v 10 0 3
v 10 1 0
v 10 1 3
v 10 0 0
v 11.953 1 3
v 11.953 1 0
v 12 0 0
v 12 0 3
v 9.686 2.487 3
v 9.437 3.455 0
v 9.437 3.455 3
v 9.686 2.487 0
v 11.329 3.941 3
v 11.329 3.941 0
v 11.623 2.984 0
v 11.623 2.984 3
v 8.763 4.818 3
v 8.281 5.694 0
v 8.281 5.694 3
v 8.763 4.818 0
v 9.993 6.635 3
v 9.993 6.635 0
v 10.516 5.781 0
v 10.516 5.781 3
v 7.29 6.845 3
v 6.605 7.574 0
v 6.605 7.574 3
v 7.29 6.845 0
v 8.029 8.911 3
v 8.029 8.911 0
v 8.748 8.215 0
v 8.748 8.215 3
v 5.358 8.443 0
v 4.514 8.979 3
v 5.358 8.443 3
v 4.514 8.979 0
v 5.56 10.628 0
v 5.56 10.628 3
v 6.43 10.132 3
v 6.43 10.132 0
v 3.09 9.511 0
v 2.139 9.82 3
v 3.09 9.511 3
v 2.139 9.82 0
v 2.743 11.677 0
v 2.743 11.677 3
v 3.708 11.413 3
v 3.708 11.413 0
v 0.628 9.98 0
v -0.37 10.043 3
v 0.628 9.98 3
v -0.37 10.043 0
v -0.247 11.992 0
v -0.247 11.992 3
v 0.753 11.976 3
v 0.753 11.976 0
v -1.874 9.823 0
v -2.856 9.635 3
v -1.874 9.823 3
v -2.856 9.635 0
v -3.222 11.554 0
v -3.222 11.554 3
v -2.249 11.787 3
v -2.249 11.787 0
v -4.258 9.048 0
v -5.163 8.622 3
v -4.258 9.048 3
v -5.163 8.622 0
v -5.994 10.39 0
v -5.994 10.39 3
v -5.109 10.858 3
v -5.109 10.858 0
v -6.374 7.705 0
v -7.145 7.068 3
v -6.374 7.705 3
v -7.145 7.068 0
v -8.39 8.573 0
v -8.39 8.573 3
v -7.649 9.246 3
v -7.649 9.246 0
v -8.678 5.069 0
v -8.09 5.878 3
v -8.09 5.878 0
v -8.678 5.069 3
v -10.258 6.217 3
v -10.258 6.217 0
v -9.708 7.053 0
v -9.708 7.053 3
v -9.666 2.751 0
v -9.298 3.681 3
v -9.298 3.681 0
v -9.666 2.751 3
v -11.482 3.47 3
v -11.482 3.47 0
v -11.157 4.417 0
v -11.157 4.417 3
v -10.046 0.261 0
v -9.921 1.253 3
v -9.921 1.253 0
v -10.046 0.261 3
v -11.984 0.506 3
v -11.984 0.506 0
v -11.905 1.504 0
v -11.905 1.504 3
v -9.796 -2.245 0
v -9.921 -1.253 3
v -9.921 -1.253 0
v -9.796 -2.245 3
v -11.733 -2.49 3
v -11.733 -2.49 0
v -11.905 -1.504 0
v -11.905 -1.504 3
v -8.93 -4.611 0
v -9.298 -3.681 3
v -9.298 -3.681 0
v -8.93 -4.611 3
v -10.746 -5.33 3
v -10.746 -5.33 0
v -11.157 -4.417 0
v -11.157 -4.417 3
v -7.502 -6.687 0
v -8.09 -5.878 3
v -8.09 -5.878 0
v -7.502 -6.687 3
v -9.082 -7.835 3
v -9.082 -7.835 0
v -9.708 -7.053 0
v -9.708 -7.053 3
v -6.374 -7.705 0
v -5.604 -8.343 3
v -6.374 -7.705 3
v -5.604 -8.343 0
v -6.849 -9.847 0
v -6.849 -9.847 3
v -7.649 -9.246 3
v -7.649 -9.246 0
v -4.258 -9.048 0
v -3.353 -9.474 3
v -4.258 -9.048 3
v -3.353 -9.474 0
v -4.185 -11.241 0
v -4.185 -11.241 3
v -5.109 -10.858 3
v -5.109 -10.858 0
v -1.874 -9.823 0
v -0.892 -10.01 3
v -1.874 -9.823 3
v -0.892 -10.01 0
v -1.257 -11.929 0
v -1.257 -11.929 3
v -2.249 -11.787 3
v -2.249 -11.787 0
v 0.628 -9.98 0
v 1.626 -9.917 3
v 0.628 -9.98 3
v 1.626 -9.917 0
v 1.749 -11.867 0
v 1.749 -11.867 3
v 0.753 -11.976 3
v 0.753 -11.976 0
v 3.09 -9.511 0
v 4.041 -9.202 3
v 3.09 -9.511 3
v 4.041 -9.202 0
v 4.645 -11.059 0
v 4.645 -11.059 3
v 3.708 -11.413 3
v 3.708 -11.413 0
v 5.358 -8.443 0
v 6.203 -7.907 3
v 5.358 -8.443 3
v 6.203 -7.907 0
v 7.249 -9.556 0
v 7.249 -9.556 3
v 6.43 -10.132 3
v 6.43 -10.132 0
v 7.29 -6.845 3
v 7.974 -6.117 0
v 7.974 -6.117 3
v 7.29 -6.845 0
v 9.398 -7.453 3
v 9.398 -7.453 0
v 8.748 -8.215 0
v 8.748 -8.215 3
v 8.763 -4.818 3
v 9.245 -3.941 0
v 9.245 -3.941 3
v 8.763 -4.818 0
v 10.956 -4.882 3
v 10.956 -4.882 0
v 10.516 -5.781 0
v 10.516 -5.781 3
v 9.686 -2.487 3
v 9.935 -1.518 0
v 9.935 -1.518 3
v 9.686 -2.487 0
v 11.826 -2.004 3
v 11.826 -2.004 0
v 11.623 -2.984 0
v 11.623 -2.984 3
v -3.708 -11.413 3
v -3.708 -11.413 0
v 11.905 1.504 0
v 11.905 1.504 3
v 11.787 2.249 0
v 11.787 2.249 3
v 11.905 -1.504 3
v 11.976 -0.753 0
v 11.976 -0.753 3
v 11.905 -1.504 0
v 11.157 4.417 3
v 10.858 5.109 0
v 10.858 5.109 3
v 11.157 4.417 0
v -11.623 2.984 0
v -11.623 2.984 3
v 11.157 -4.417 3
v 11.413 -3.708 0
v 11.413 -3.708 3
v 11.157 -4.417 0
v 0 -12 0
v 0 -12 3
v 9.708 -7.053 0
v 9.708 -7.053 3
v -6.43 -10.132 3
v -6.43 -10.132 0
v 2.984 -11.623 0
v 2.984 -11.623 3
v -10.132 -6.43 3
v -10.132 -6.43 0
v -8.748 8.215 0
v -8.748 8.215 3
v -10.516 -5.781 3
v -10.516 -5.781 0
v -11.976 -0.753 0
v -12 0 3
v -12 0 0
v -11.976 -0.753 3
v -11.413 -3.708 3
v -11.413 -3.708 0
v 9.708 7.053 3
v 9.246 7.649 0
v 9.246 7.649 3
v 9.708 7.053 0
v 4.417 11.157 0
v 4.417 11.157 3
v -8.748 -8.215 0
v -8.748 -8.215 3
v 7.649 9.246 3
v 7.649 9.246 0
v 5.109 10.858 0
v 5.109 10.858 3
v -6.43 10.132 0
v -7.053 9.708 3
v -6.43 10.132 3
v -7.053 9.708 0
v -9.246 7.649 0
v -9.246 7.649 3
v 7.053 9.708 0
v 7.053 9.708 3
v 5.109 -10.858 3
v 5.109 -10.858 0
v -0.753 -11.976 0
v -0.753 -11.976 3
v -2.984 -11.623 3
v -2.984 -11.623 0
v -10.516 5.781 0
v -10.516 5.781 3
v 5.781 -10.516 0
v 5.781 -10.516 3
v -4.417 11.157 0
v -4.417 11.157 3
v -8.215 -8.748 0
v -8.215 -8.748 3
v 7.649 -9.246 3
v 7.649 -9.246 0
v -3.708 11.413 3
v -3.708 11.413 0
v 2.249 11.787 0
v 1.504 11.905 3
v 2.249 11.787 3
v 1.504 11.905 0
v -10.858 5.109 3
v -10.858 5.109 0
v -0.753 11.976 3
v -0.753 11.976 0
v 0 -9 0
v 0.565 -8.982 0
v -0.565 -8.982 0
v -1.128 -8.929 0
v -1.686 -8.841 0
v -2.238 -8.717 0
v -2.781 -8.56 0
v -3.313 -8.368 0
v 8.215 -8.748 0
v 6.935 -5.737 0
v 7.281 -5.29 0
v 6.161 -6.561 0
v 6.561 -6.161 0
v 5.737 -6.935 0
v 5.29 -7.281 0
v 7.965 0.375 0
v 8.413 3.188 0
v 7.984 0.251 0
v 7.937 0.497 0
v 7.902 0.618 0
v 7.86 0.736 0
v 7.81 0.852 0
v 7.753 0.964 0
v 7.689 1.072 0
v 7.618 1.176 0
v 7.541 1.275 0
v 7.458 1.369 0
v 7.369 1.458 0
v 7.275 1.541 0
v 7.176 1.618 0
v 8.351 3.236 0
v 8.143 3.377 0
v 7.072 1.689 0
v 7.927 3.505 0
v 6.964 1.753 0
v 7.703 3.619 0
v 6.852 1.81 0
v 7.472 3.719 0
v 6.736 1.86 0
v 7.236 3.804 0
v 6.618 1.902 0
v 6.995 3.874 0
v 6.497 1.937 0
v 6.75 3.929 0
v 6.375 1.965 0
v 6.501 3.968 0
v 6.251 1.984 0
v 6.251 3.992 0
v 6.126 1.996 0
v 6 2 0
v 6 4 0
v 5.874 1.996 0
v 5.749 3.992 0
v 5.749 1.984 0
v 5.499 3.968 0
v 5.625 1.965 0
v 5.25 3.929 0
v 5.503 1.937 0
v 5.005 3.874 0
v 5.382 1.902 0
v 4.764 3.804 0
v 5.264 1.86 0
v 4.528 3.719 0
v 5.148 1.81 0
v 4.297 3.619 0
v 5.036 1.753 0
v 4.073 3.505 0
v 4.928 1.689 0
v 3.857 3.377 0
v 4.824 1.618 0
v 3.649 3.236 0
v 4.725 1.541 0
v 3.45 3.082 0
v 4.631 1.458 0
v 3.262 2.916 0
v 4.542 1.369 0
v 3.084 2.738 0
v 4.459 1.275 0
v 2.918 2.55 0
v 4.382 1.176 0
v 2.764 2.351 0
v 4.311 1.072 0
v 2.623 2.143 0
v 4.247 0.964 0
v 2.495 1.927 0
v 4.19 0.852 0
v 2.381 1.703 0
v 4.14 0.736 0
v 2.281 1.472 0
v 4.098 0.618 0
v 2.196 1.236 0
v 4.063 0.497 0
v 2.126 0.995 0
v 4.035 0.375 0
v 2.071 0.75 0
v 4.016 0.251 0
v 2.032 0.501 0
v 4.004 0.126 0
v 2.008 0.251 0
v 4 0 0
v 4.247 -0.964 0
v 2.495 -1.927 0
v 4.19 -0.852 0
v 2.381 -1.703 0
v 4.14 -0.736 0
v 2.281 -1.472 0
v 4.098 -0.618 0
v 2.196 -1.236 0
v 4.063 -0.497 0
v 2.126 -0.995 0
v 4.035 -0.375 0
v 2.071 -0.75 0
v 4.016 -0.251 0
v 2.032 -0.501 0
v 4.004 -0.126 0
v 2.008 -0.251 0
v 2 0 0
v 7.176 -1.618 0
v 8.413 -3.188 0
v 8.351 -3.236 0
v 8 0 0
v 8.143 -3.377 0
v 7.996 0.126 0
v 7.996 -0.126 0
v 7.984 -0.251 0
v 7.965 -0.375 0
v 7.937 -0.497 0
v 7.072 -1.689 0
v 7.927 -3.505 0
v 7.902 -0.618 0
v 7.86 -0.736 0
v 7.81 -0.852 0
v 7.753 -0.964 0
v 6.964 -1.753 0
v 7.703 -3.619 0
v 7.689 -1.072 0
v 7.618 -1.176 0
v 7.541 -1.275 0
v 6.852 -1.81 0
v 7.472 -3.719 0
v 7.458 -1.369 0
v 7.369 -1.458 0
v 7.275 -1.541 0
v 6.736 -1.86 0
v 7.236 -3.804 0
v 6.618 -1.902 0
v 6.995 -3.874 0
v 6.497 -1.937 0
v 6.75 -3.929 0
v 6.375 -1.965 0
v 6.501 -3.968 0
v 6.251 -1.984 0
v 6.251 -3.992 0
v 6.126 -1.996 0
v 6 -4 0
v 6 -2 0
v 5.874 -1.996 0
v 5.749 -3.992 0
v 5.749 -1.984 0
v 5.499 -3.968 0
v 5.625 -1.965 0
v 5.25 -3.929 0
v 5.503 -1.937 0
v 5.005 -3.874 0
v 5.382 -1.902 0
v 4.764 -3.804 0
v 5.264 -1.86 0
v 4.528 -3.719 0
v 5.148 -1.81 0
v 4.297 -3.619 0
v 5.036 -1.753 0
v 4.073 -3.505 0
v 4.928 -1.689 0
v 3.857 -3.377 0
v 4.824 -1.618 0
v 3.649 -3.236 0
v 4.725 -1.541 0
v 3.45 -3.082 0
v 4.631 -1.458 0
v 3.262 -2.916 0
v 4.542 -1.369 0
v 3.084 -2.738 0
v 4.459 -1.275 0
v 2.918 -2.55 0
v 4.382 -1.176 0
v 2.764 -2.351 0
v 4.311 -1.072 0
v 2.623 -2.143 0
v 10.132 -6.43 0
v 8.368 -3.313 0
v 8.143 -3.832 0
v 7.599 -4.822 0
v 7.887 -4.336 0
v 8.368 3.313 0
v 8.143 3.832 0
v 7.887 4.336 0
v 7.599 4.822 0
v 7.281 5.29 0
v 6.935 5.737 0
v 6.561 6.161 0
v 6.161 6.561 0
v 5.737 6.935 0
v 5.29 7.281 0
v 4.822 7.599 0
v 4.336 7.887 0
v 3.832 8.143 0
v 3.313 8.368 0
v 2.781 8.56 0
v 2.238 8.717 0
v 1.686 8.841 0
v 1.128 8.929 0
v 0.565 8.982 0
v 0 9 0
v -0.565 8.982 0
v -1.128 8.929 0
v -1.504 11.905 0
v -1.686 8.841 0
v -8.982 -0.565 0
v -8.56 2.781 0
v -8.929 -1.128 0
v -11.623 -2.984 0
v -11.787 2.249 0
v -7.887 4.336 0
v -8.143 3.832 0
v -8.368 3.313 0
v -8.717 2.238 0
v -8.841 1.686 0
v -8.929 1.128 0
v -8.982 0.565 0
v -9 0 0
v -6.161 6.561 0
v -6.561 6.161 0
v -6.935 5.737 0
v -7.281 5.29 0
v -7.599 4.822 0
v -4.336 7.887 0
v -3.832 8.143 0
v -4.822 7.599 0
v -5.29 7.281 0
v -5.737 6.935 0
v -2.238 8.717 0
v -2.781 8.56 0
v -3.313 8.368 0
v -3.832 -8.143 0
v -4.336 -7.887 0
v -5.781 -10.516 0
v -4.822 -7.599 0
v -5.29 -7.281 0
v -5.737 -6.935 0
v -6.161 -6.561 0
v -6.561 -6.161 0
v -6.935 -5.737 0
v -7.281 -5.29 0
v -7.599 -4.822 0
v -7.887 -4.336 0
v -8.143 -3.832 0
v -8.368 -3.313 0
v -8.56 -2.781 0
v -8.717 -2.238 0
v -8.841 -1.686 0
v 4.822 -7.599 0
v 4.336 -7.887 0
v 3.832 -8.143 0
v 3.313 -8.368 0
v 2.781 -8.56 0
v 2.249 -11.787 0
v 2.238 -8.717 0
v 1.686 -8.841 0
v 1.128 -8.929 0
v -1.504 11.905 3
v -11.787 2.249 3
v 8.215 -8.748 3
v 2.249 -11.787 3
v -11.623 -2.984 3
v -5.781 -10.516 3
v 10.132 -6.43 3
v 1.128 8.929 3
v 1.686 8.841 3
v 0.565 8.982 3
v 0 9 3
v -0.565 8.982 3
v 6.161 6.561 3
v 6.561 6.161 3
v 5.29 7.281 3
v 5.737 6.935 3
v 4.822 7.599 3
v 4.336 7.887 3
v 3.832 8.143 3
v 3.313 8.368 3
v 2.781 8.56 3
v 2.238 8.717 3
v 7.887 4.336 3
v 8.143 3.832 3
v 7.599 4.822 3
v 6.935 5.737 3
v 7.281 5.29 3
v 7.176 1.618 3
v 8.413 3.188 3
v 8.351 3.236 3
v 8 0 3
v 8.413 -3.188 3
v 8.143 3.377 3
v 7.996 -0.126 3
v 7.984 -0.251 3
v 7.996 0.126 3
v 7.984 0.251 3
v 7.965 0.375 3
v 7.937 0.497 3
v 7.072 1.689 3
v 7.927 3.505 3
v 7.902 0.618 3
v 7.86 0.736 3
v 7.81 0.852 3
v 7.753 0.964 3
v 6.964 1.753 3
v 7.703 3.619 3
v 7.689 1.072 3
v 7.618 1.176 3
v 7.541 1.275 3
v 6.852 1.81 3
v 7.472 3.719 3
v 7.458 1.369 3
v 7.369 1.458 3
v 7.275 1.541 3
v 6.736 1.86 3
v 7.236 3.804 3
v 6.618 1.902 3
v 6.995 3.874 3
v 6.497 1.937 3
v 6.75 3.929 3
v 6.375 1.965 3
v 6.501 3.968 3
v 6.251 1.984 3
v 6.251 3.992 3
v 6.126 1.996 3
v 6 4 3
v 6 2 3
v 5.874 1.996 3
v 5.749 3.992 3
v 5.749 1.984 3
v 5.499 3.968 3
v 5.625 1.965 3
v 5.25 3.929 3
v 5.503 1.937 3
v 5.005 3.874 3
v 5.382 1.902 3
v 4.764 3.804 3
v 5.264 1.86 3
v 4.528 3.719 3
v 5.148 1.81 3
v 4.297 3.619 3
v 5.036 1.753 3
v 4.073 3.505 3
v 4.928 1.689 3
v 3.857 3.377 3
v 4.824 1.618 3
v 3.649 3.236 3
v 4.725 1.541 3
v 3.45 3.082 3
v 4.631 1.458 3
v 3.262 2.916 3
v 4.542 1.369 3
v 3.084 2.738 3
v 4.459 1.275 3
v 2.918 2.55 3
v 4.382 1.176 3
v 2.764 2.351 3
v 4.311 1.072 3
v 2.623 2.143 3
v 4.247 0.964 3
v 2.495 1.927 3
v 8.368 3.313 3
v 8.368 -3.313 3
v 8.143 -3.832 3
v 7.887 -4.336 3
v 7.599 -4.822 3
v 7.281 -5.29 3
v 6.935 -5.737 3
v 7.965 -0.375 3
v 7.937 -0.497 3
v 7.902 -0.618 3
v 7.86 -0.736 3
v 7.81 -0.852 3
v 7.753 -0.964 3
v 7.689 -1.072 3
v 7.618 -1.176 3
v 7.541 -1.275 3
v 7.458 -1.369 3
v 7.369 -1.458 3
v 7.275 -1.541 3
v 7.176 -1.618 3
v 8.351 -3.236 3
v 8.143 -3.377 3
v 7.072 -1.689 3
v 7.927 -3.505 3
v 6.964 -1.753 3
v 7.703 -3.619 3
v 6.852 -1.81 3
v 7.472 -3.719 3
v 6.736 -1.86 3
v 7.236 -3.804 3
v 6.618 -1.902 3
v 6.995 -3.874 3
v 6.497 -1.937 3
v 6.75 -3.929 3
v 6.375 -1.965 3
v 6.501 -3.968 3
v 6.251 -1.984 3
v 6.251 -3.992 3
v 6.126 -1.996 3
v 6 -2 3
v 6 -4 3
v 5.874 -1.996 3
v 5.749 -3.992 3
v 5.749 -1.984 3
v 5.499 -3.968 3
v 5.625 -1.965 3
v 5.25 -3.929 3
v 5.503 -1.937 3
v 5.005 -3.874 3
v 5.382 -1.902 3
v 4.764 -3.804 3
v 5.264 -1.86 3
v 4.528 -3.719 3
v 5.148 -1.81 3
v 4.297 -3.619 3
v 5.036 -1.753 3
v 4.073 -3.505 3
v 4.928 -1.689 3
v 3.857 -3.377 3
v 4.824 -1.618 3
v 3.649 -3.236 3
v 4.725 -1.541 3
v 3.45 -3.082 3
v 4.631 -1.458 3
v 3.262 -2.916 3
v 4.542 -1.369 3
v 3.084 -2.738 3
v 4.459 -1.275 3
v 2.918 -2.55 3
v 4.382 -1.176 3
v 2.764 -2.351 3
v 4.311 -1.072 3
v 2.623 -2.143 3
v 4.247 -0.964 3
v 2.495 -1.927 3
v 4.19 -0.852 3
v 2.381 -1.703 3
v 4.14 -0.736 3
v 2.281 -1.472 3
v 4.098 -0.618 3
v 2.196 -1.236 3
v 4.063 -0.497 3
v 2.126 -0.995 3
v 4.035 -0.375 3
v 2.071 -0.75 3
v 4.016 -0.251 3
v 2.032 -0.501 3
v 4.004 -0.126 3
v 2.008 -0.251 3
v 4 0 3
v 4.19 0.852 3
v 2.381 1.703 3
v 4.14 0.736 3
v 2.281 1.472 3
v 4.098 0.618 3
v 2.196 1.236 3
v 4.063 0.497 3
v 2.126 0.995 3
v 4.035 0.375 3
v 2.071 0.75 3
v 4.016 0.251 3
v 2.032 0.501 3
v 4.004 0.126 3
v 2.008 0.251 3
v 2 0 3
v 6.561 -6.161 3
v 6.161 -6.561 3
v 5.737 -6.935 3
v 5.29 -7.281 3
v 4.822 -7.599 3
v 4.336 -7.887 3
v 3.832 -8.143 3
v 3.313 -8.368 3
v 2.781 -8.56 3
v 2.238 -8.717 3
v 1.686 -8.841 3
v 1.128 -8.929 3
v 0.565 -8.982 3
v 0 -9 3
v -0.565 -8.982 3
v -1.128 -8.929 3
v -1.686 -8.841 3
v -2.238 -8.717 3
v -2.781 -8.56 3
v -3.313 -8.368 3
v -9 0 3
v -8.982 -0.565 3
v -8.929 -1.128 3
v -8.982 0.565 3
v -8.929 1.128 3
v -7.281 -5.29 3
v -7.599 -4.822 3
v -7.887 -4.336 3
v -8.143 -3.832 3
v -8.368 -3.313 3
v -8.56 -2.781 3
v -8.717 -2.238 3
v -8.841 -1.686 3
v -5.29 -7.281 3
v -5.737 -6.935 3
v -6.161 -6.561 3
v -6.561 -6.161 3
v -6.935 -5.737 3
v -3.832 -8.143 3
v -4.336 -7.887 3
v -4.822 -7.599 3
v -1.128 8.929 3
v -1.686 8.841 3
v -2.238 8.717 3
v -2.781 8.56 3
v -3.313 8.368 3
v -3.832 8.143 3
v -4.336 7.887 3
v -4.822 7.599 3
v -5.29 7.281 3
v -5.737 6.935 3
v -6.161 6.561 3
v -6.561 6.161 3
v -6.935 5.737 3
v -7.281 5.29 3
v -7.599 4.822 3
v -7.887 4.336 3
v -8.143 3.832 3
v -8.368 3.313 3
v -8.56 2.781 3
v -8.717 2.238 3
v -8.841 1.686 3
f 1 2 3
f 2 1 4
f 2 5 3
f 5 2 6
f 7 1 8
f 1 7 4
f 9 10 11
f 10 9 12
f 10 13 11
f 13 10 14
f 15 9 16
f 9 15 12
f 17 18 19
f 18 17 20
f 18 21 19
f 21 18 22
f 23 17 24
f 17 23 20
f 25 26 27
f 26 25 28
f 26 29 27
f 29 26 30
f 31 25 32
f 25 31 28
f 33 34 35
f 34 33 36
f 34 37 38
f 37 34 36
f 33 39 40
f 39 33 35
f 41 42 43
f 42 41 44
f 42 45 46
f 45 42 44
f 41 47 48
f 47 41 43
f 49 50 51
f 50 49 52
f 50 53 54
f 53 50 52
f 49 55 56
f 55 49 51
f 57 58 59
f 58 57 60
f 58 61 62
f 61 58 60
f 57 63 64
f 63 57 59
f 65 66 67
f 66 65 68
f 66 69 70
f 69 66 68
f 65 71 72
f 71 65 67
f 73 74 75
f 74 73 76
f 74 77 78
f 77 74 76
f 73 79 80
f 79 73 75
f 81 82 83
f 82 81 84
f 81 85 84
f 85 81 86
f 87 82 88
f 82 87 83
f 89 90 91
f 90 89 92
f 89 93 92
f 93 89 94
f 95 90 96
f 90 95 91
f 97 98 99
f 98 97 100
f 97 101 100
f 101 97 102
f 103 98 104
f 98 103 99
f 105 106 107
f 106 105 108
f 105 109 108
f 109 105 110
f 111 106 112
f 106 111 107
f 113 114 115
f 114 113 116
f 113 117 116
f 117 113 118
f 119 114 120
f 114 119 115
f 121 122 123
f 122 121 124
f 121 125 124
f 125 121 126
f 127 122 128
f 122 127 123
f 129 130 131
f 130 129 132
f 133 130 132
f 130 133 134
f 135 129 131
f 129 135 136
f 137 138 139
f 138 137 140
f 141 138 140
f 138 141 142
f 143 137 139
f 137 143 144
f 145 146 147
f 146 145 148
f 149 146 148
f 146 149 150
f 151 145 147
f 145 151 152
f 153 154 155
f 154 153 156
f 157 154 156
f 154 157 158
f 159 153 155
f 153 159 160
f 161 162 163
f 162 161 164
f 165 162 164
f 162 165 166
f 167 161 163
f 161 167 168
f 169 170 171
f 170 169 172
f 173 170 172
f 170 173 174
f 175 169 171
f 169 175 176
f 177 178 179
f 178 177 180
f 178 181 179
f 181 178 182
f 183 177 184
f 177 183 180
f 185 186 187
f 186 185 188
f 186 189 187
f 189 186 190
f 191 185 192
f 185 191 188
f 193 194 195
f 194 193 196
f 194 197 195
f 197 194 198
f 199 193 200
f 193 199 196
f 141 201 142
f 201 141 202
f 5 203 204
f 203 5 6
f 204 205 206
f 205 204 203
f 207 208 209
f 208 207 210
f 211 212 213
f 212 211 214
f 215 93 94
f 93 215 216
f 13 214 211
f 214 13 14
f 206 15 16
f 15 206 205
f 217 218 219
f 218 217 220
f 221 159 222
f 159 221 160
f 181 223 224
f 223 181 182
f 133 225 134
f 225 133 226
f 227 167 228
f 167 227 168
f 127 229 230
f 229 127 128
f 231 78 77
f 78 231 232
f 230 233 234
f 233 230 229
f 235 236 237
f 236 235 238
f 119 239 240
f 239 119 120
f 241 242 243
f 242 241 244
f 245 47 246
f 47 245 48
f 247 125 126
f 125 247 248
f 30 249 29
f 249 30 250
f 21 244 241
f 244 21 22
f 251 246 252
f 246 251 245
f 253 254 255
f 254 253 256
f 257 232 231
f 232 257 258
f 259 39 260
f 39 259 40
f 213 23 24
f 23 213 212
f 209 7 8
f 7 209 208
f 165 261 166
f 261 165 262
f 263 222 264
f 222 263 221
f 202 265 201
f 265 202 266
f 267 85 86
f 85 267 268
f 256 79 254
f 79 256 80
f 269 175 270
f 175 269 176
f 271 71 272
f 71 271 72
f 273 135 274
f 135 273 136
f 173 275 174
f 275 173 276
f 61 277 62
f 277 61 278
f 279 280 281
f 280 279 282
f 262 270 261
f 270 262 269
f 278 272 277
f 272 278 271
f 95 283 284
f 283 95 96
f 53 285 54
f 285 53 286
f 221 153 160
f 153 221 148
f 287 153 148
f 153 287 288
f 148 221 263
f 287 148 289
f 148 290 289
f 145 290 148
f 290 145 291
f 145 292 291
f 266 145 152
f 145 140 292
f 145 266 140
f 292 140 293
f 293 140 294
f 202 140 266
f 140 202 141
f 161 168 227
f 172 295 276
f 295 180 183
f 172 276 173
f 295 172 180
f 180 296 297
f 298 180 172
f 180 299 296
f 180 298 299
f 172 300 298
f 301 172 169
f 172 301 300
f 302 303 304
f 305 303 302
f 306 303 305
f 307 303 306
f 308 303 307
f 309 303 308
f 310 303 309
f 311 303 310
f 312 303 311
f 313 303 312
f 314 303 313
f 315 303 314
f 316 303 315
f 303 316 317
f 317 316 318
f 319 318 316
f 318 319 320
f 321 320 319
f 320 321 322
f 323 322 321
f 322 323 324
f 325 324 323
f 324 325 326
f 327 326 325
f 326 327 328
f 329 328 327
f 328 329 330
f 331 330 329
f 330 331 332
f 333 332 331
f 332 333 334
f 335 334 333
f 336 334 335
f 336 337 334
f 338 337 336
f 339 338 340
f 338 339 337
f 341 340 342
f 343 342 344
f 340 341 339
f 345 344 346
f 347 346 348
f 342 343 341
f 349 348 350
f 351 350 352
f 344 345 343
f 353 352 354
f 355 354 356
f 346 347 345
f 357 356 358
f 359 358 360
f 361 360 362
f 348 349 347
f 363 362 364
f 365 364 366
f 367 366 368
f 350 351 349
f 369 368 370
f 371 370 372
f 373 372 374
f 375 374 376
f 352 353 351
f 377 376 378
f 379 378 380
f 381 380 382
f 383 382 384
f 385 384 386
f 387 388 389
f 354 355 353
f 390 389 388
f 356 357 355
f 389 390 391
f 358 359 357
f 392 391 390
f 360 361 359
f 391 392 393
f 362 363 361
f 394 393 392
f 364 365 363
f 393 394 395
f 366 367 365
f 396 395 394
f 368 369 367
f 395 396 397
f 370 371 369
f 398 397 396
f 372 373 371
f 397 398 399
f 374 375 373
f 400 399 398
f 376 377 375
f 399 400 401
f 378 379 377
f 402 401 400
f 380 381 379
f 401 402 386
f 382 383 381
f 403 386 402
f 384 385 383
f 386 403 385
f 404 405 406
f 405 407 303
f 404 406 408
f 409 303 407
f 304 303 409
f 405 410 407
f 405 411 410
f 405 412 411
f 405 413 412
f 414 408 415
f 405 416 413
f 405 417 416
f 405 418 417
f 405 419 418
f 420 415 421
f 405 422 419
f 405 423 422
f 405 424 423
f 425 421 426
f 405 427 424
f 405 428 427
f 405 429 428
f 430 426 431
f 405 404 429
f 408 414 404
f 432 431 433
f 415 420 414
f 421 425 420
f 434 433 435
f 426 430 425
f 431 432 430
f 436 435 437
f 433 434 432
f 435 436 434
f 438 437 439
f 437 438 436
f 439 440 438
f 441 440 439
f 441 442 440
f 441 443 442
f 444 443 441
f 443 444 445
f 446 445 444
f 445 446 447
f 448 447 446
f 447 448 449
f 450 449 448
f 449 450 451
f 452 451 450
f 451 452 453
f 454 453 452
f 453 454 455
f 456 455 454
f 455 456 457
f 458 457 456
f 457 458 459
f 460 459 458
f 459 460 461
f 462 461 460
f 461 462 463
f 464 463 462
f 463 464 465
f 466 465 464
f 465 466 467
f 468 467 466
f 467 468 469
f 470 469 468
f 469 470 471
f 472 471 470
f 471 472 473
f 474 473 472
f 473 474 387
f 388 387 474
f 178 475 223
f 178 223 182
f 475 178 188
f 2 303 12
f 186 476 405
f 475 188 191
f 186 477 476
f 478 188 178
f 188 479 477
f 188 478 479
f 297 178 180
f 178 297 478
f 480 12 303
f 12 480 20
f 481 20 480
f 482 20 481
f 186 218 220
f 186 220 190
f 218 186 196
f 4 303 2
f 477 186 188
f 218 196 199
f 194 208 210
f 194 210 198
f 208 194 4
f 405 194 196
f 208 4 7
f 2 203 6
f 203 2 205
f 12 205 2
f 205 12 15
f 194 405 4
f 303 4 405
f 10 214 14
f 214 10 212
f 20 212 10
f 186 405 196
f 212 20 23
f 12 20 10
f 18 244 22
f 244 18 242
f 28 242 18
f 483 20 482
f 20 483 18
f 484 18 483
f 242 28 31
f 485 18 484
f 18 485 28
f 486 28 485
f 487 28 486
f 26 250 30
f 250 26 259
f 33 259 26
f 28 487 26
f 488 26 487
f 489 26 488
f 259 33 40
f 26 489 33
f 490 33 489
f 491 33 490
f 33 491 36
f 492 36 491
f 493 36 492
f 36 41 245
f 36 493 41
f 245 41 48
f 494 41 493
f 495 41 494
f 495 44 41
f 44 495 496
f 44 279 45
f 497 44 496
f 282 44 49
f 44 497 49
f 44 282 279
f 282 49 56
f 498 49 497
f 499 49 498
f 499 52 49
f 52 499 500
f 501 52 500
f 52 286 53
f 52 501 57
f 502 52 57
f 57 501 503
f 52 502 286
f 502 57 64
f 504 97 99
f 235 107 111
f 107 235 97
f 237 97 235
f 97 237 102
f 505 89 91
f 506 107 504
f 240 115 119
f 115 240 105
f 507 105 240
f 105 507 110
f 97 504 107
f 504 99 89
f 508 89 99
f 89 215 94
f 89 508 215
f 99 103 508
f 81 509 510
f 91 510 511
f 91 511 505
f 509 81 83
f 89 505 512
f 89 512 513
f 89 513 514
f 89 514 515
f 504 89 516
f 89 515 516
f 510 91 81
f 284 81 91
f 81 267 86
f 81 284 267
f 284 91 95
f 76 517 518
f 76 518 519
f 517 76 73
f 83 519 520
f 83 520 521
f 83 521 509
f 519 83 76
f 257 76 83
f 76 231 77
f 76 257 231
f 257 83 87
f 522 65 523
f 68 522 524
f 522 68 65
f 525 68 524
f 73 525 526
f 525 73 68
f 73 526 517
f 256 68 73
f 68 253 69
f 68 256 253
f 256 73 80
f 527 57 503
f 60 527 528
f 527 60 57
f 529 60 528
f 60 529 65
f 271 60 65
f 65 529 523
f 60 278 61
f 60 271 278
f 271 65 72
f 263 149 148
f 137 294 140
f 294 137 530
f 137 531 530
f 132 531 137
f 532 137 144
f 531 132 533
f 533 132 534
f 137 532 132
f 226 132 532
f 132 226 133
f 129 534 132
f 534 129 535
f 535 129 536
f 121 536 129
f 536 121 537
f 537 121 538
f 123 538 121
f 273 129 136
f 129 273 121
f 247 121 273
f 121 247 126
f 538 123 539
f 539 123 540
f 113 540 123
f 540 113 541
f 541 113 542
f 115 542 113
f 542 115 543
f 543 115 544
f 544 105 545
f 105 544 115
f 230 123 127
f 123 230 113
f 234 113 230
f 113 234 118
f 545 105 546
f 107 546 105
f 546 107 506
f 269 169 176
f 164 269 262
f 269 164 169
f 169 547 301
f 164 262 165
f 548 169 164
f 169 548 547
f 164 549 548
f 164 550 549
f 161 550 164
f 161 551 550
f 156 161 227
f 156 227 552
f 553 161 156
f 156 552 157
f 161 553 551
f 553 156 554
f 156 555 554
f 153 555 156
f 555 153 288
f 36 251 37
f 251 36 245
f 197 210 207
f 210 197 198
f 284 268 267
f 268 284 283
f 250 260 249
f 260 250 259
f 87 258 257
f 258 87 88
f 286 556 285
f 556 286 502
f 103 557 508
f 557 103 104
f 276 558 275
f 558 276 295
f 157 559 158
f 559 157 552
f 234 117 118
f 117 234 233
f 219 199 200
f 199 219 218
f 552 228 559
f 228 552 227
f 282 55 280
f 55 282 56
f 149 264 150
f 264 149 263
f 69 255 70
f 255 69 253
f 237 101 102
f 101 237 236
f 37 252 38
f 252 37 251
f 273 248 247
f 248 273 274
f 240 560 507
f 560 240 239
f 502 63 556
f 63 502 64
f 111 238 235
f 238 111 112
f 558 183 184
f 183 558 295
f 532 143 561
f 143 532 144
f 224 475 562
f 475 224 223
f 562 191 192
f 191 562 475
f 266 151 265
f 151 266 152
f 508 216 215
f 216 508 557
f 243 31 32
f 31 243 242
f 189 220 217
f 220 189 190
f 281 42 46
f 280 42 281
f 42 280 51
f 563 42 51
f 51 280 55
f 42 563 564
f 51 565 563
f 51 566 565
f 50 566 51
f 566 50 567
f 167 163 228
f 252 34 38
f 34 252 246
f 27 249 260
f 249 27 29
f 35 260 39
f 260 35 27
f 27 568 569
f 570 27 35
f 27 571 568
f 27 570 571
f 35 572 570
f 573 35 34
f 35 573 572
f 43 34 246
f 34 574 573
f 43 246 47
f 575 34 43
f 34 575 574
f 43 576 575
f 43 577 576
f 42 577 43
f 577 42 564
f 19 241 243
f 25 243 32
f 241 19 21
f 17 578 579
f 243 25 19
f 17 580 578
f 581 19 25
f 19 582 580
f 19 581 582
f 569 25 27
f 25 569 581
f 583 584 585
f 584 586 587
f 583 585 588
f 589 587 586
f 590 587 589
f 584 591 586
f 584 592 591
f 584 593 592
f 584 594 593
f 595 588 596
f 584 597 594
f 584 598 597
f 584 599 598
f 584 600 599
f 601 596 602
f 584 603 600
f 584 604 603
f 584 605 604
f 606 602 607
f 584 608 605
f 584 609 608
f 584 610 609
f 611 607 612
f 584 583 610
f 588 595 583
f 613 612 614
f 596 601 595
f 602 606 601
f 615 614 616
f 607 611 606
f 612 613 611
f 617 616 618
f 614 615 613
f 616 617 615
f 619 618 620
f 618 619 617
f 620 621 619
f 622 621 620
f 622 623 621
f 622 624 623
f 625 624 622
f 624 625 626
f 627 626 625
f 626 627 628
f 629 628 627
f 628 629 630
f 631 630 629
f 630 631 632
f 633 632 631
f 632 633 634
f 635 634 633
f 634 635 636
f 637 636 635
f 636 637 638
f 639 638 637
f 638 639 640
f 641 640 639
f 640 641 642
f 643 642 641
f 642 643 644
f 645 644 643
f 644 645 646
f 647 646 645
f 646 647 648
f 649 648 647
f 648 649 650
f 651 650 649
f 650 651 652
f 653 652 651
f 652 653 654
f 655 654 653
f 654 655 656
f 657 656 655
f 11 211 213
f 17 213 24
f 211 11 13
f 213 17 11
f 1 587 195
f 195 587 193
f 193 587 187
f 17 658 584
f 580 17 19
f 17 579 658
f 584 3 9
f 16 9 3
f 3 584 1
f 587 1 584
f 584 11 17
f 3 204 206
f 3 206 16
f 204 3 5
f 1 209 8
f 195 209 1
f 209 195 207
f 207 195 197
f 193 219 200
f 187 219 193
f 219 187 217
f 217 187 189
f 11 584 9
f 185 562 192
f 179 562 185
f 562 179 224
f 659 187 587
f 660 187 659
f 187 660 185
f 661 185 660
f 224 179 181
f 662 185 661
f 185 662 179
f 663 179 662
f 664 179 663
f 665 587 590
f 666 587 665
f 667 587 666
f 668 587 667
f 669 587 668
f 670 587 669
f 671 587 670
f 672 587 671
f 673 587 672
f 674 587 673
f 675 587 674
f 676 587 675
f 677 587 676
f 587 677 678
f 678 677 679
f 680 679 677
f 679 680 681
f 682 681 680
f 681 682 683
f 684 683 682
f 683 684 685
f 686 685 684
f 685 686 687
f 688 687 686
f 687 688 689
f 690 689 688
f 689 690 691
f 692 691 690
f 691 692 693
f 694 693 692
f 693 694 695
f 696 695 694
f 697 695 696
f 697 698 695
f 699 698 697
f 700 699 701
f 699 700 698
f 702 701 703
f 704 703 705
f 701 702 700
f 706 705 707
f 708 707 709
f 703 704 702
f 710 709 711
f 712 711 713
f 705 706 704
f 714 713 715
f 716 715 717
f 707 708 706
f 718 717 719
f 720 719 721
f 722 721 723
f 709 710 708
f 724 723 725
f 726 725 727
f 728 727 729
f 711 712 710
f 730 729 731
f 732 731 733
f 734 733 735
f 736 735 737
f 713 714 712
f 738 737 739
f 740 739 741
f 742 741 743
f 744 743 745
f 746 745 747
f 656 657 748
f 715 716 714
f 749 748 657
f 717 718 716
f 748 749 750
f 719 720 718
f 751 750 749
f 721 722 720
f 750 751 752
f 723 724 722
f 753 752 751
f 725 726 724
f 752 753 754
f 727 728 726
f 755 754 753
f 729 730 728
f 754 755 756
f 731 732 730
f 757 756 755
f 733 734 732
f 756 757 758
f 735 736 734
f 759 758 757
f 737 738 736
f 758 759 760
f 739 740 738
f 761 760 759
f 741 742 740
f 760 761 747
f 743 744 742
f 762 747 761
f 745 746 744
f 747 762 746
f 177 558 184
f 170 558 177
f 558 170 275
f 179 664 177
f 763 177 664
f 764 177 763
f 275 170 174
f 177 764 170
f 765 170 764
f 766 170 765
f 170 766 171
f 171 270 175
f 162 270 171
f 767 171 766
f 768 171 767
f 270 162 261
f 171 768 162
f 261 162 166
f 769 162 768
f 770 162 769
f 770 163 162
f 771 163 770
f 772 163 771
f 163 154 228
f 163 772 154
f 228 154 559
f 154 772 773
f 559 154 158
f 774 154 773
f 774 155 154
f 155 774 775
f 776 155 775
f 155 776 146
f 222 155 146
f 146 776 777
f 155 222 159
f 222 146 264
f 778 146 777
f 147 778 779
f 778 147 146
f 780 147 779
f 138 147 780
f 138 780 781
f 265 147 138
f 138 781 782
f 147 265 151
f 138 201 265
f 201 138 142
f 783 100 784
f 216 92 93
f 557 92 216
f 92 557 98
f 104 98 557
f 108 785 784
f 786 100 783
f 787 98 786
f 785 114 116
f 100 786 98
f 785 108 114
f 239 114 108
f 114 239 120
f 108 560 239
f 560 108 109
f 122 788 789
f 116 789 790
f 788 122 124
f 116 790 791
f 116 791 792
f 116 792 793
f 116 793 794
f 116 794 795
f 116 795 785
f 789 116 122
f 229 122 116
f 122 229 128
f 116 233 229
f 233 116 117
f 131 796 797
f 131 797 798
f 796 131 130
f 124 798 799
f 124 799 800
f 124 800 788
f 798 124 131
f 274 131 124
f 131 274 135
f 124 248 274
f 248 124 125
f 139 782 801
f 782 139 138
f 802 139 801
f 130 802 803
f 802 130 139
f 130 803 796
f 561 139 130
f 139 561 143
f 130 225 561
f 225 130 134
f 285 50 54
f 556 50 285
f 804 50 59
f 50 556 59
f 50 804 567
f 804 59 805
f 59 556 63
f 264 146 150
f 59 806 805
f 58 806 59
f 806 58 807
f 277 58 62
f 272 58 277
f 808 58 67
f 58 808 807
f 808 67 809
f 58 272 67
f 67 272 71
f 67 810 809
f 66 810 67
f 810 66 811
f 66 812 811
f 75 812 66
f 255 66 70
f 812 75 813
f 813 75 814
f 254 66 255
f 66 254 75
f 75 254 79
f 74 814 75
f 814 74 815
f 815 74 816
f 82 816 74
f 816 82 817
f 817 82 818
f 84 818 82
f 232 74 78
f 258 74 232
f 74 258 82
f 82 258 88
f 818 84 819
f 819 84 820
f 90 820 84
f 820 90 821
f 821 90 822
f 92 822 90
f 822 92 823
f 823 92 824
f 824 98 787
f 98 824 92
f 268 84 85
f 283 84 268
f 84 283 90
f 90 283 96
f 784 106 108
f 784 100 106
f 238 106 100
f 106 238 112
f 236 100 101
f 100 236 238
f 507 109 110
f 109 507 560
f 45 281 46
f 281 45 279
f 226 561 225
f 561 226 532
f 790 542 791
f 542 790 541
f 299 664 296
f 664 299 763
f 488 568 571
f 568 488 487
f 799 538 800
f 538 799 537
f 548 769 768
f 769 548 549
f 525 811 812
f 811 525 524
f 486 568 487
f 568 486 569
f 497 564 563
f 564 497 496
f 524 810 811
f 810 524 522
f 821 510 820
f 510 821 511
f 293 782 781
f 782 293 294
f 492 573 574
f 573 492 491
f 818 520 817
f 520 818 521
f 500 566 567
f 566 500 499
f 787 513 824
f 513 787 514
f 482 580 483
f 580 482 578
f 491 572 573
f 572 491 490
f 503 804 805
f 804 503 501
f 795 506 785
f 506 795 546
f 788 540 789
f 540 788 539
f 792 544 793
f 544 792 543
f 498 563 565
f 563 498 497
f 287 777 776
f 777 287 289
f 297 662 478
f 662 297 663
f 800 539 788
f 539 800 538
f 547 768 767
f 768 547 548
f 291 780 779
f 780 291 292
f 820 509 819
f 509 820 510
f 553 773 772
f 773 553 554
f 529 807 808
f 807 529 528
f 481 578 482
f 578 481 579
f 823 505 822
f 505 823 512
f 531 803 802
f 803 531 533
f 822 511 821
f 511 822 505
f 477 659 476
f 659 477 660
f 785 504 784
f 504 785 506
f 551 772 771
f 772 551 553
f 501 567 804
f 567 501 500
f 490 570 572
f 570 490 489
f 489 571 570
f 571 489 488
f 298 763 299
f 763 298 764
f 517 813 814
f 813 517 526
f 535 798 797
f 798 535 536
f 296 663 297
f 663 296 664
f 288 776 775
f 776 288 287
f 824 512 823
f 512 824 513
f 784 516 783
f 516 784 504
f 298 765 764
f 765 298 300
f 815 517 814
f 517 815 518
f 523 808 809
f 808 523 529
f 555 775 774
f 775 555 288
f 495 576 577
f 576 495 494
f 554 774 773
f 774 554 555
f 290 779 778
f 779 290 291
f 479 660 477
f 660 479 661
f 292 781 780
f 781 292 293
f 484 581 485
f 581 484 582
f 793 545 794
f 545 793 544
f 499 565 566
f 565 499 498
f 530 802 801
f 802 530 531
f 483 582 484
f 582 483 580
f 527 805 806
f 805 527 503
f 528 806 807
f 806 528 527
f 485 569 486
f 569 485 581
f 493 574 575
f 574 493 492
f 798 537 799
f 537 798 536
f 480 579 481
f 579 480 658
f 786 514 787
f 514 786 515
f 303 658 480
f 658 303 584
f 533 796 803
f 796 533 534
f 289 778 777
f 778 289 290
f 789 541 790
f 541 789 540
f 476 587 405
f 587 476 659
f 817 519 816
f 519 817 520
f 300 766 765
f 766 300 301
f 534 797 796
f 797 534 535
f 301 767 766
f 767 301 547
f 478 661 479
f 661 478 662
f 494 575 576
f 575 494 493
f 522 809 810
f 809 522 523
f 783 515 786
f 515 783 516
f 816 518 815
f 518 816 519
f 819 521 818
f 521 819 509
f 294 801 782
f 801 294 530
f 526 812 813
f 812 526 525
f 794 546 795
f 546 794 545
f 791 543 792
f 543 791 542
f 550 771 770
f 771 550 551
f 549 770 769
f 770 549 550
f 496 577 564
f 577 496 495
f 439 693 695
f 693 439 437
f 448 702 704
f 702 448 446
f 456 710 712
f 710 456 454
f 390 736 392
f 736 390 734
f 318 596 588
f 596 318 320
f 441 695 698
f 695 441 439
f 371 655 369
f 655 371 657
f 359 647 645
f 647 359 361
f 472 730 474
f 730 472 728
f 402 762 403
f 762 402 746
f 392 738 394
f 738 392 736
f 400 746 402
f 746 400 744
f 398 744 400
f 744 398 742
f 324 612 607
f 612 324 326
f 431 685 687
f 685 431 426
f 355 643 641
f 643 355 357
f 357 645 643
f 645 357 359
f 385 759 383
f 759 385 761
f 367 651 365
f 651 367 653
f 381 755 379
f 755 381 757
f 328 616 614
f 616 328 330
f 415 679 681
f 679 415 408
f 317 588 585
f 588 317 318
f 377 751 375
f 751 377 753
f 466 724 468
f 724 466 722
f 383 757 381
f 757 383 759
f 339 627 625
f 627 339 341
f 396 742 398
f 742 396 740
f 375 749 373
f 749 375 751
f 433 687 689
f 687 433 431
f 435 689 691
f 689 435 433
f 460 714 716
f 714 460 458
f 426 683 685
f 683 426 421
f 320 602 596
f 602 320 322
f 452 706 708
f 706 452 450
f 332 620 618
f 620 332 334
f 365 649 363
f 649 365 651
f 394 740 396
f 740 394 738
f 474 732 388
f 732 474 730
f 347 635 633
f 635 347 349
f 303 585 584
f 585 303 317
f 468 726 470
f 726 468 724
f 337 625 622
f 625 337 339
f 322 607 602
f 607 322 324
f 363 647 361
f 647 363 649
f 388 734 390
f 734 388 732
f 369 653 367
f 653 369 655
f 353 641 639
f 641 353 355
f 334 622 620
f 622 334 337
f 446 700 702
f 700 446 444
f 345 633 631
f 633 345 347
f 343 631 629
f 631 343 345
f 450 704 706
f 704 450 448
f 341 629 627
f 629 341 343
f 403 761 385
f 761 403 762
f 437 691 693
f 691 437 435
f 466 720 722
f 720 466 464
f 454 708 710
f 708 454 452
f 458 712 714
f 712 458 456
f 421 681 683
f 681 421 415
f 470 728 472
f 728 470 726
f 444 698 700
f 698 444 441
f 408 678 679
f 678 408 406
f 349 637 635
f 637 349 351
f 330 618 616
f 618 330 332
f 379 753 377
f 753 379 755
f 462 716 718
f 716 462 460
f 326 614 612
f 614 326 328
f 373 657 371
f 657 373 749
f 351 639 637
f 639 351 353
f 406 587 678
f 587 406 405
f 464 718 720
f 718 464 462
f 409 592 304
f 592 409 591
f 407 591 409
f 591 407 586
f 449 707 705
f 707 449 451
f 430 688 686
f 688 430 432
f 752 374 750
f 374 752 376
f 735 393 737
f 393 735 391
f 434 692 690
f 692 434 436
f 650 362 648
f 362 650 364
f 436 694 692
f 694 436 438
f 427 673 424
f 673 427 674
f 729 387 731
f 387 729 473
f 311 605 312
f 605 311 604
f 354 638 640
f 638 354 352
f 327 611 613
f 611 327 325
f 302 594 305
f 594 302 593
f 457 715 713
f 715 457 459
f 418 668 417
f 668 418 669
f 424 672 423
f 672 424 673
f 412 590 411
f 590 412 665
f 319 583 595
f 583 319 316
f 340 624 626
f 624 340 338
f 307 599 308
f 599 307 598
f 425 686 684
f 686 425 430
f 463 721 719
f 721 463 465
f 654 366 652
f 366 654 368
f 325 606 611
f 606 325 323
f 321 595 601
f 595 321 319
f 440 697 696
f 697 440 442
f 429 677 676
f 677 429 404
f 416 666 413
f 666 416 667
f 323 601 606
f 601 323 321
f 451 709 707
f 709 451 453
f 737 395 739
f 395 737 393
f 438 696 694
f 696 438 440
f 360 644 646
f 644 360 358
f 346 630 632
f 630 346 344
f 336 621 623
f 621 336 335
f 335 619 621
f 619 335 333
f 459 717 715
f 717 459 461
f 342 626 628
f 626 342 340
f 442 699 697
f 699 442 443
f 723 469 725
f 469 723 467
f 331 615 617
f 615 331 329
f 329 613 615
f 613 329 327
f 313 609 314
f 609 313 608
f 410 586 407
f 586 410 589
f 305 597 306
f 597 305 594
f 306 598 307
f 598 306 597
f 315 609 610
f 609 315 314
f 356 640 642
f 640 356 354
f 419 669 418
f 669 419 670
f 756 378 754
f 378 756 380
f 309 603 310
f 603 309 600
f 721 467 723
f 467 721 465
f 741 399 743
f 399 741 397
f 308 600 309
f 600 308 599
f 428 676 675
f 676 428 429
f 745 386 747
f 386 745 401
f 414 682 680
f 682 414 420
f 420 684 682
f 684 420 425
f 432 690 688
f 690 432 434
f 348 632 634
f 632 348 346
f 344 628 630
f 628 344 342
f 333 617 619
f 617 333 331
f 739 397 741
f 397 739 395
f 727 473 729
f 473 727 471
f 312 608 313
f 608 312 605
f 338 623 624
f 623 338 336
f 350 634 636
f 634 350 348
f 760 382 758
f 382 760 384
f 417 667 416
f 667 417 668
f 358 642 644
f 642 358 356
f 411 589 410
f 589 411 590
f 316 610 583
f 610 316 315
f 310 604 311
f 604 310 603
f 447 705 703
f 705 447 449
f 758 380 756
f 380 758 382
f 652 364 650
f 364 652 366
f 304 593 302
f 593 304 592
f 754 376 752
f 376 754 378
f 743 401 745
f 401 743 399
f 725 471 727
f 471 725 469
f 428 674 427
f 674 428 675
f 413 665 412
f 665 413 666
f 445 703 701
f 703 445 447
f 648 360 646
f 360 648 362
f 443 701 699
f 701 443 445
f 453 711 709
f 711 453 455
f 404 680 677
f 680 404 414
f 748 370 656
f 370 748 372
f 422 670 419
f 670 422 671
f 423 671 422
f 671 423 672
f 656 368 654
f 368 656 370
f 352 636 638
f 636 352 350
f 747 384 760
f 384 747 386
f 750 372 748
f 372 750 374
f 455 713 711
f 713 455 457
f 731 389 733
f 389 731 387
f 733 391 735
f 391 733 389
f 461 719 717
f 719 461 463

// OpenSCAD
// (c) 2012 Felipe Correa da Silva Sanches <fsanches@metamaquina.com.br>
// Licenciado sob GNU GPL v3 (or later)

// Lobster font by Pablo Impallari <http://www.impallari.com/lobster/>

$fn=100;

x=2;
n=25;
altura=3;
altura_42=4;

raio=10;
r2=4;

linear_extrude(height=altura_42) translate([-9, 8.2, 0]) rotate([0, 0, -90]) scale(0.055) import(file="42.dxf");

difference(){
	translate([0, 0, 0]) cylinder(r=raio+x, h=altura);

	for (i=[0:n]){
		rotate([0, 0, i*360/n]) translate([raio, 0, -0.1]) cube([2*x, 1, altura+0.2]);
	}

	translate([0, 0, -0.1]) cylinder(r=10-1, h=altura+0.2);
}

translate([raio-r2, 0, 0]){
	difference(){
		cylinder(r=r2, h=altura);
		translate([0, 0, -0.1]) cylinder(r=r2/2, h=altura+0.2);
	}
}
